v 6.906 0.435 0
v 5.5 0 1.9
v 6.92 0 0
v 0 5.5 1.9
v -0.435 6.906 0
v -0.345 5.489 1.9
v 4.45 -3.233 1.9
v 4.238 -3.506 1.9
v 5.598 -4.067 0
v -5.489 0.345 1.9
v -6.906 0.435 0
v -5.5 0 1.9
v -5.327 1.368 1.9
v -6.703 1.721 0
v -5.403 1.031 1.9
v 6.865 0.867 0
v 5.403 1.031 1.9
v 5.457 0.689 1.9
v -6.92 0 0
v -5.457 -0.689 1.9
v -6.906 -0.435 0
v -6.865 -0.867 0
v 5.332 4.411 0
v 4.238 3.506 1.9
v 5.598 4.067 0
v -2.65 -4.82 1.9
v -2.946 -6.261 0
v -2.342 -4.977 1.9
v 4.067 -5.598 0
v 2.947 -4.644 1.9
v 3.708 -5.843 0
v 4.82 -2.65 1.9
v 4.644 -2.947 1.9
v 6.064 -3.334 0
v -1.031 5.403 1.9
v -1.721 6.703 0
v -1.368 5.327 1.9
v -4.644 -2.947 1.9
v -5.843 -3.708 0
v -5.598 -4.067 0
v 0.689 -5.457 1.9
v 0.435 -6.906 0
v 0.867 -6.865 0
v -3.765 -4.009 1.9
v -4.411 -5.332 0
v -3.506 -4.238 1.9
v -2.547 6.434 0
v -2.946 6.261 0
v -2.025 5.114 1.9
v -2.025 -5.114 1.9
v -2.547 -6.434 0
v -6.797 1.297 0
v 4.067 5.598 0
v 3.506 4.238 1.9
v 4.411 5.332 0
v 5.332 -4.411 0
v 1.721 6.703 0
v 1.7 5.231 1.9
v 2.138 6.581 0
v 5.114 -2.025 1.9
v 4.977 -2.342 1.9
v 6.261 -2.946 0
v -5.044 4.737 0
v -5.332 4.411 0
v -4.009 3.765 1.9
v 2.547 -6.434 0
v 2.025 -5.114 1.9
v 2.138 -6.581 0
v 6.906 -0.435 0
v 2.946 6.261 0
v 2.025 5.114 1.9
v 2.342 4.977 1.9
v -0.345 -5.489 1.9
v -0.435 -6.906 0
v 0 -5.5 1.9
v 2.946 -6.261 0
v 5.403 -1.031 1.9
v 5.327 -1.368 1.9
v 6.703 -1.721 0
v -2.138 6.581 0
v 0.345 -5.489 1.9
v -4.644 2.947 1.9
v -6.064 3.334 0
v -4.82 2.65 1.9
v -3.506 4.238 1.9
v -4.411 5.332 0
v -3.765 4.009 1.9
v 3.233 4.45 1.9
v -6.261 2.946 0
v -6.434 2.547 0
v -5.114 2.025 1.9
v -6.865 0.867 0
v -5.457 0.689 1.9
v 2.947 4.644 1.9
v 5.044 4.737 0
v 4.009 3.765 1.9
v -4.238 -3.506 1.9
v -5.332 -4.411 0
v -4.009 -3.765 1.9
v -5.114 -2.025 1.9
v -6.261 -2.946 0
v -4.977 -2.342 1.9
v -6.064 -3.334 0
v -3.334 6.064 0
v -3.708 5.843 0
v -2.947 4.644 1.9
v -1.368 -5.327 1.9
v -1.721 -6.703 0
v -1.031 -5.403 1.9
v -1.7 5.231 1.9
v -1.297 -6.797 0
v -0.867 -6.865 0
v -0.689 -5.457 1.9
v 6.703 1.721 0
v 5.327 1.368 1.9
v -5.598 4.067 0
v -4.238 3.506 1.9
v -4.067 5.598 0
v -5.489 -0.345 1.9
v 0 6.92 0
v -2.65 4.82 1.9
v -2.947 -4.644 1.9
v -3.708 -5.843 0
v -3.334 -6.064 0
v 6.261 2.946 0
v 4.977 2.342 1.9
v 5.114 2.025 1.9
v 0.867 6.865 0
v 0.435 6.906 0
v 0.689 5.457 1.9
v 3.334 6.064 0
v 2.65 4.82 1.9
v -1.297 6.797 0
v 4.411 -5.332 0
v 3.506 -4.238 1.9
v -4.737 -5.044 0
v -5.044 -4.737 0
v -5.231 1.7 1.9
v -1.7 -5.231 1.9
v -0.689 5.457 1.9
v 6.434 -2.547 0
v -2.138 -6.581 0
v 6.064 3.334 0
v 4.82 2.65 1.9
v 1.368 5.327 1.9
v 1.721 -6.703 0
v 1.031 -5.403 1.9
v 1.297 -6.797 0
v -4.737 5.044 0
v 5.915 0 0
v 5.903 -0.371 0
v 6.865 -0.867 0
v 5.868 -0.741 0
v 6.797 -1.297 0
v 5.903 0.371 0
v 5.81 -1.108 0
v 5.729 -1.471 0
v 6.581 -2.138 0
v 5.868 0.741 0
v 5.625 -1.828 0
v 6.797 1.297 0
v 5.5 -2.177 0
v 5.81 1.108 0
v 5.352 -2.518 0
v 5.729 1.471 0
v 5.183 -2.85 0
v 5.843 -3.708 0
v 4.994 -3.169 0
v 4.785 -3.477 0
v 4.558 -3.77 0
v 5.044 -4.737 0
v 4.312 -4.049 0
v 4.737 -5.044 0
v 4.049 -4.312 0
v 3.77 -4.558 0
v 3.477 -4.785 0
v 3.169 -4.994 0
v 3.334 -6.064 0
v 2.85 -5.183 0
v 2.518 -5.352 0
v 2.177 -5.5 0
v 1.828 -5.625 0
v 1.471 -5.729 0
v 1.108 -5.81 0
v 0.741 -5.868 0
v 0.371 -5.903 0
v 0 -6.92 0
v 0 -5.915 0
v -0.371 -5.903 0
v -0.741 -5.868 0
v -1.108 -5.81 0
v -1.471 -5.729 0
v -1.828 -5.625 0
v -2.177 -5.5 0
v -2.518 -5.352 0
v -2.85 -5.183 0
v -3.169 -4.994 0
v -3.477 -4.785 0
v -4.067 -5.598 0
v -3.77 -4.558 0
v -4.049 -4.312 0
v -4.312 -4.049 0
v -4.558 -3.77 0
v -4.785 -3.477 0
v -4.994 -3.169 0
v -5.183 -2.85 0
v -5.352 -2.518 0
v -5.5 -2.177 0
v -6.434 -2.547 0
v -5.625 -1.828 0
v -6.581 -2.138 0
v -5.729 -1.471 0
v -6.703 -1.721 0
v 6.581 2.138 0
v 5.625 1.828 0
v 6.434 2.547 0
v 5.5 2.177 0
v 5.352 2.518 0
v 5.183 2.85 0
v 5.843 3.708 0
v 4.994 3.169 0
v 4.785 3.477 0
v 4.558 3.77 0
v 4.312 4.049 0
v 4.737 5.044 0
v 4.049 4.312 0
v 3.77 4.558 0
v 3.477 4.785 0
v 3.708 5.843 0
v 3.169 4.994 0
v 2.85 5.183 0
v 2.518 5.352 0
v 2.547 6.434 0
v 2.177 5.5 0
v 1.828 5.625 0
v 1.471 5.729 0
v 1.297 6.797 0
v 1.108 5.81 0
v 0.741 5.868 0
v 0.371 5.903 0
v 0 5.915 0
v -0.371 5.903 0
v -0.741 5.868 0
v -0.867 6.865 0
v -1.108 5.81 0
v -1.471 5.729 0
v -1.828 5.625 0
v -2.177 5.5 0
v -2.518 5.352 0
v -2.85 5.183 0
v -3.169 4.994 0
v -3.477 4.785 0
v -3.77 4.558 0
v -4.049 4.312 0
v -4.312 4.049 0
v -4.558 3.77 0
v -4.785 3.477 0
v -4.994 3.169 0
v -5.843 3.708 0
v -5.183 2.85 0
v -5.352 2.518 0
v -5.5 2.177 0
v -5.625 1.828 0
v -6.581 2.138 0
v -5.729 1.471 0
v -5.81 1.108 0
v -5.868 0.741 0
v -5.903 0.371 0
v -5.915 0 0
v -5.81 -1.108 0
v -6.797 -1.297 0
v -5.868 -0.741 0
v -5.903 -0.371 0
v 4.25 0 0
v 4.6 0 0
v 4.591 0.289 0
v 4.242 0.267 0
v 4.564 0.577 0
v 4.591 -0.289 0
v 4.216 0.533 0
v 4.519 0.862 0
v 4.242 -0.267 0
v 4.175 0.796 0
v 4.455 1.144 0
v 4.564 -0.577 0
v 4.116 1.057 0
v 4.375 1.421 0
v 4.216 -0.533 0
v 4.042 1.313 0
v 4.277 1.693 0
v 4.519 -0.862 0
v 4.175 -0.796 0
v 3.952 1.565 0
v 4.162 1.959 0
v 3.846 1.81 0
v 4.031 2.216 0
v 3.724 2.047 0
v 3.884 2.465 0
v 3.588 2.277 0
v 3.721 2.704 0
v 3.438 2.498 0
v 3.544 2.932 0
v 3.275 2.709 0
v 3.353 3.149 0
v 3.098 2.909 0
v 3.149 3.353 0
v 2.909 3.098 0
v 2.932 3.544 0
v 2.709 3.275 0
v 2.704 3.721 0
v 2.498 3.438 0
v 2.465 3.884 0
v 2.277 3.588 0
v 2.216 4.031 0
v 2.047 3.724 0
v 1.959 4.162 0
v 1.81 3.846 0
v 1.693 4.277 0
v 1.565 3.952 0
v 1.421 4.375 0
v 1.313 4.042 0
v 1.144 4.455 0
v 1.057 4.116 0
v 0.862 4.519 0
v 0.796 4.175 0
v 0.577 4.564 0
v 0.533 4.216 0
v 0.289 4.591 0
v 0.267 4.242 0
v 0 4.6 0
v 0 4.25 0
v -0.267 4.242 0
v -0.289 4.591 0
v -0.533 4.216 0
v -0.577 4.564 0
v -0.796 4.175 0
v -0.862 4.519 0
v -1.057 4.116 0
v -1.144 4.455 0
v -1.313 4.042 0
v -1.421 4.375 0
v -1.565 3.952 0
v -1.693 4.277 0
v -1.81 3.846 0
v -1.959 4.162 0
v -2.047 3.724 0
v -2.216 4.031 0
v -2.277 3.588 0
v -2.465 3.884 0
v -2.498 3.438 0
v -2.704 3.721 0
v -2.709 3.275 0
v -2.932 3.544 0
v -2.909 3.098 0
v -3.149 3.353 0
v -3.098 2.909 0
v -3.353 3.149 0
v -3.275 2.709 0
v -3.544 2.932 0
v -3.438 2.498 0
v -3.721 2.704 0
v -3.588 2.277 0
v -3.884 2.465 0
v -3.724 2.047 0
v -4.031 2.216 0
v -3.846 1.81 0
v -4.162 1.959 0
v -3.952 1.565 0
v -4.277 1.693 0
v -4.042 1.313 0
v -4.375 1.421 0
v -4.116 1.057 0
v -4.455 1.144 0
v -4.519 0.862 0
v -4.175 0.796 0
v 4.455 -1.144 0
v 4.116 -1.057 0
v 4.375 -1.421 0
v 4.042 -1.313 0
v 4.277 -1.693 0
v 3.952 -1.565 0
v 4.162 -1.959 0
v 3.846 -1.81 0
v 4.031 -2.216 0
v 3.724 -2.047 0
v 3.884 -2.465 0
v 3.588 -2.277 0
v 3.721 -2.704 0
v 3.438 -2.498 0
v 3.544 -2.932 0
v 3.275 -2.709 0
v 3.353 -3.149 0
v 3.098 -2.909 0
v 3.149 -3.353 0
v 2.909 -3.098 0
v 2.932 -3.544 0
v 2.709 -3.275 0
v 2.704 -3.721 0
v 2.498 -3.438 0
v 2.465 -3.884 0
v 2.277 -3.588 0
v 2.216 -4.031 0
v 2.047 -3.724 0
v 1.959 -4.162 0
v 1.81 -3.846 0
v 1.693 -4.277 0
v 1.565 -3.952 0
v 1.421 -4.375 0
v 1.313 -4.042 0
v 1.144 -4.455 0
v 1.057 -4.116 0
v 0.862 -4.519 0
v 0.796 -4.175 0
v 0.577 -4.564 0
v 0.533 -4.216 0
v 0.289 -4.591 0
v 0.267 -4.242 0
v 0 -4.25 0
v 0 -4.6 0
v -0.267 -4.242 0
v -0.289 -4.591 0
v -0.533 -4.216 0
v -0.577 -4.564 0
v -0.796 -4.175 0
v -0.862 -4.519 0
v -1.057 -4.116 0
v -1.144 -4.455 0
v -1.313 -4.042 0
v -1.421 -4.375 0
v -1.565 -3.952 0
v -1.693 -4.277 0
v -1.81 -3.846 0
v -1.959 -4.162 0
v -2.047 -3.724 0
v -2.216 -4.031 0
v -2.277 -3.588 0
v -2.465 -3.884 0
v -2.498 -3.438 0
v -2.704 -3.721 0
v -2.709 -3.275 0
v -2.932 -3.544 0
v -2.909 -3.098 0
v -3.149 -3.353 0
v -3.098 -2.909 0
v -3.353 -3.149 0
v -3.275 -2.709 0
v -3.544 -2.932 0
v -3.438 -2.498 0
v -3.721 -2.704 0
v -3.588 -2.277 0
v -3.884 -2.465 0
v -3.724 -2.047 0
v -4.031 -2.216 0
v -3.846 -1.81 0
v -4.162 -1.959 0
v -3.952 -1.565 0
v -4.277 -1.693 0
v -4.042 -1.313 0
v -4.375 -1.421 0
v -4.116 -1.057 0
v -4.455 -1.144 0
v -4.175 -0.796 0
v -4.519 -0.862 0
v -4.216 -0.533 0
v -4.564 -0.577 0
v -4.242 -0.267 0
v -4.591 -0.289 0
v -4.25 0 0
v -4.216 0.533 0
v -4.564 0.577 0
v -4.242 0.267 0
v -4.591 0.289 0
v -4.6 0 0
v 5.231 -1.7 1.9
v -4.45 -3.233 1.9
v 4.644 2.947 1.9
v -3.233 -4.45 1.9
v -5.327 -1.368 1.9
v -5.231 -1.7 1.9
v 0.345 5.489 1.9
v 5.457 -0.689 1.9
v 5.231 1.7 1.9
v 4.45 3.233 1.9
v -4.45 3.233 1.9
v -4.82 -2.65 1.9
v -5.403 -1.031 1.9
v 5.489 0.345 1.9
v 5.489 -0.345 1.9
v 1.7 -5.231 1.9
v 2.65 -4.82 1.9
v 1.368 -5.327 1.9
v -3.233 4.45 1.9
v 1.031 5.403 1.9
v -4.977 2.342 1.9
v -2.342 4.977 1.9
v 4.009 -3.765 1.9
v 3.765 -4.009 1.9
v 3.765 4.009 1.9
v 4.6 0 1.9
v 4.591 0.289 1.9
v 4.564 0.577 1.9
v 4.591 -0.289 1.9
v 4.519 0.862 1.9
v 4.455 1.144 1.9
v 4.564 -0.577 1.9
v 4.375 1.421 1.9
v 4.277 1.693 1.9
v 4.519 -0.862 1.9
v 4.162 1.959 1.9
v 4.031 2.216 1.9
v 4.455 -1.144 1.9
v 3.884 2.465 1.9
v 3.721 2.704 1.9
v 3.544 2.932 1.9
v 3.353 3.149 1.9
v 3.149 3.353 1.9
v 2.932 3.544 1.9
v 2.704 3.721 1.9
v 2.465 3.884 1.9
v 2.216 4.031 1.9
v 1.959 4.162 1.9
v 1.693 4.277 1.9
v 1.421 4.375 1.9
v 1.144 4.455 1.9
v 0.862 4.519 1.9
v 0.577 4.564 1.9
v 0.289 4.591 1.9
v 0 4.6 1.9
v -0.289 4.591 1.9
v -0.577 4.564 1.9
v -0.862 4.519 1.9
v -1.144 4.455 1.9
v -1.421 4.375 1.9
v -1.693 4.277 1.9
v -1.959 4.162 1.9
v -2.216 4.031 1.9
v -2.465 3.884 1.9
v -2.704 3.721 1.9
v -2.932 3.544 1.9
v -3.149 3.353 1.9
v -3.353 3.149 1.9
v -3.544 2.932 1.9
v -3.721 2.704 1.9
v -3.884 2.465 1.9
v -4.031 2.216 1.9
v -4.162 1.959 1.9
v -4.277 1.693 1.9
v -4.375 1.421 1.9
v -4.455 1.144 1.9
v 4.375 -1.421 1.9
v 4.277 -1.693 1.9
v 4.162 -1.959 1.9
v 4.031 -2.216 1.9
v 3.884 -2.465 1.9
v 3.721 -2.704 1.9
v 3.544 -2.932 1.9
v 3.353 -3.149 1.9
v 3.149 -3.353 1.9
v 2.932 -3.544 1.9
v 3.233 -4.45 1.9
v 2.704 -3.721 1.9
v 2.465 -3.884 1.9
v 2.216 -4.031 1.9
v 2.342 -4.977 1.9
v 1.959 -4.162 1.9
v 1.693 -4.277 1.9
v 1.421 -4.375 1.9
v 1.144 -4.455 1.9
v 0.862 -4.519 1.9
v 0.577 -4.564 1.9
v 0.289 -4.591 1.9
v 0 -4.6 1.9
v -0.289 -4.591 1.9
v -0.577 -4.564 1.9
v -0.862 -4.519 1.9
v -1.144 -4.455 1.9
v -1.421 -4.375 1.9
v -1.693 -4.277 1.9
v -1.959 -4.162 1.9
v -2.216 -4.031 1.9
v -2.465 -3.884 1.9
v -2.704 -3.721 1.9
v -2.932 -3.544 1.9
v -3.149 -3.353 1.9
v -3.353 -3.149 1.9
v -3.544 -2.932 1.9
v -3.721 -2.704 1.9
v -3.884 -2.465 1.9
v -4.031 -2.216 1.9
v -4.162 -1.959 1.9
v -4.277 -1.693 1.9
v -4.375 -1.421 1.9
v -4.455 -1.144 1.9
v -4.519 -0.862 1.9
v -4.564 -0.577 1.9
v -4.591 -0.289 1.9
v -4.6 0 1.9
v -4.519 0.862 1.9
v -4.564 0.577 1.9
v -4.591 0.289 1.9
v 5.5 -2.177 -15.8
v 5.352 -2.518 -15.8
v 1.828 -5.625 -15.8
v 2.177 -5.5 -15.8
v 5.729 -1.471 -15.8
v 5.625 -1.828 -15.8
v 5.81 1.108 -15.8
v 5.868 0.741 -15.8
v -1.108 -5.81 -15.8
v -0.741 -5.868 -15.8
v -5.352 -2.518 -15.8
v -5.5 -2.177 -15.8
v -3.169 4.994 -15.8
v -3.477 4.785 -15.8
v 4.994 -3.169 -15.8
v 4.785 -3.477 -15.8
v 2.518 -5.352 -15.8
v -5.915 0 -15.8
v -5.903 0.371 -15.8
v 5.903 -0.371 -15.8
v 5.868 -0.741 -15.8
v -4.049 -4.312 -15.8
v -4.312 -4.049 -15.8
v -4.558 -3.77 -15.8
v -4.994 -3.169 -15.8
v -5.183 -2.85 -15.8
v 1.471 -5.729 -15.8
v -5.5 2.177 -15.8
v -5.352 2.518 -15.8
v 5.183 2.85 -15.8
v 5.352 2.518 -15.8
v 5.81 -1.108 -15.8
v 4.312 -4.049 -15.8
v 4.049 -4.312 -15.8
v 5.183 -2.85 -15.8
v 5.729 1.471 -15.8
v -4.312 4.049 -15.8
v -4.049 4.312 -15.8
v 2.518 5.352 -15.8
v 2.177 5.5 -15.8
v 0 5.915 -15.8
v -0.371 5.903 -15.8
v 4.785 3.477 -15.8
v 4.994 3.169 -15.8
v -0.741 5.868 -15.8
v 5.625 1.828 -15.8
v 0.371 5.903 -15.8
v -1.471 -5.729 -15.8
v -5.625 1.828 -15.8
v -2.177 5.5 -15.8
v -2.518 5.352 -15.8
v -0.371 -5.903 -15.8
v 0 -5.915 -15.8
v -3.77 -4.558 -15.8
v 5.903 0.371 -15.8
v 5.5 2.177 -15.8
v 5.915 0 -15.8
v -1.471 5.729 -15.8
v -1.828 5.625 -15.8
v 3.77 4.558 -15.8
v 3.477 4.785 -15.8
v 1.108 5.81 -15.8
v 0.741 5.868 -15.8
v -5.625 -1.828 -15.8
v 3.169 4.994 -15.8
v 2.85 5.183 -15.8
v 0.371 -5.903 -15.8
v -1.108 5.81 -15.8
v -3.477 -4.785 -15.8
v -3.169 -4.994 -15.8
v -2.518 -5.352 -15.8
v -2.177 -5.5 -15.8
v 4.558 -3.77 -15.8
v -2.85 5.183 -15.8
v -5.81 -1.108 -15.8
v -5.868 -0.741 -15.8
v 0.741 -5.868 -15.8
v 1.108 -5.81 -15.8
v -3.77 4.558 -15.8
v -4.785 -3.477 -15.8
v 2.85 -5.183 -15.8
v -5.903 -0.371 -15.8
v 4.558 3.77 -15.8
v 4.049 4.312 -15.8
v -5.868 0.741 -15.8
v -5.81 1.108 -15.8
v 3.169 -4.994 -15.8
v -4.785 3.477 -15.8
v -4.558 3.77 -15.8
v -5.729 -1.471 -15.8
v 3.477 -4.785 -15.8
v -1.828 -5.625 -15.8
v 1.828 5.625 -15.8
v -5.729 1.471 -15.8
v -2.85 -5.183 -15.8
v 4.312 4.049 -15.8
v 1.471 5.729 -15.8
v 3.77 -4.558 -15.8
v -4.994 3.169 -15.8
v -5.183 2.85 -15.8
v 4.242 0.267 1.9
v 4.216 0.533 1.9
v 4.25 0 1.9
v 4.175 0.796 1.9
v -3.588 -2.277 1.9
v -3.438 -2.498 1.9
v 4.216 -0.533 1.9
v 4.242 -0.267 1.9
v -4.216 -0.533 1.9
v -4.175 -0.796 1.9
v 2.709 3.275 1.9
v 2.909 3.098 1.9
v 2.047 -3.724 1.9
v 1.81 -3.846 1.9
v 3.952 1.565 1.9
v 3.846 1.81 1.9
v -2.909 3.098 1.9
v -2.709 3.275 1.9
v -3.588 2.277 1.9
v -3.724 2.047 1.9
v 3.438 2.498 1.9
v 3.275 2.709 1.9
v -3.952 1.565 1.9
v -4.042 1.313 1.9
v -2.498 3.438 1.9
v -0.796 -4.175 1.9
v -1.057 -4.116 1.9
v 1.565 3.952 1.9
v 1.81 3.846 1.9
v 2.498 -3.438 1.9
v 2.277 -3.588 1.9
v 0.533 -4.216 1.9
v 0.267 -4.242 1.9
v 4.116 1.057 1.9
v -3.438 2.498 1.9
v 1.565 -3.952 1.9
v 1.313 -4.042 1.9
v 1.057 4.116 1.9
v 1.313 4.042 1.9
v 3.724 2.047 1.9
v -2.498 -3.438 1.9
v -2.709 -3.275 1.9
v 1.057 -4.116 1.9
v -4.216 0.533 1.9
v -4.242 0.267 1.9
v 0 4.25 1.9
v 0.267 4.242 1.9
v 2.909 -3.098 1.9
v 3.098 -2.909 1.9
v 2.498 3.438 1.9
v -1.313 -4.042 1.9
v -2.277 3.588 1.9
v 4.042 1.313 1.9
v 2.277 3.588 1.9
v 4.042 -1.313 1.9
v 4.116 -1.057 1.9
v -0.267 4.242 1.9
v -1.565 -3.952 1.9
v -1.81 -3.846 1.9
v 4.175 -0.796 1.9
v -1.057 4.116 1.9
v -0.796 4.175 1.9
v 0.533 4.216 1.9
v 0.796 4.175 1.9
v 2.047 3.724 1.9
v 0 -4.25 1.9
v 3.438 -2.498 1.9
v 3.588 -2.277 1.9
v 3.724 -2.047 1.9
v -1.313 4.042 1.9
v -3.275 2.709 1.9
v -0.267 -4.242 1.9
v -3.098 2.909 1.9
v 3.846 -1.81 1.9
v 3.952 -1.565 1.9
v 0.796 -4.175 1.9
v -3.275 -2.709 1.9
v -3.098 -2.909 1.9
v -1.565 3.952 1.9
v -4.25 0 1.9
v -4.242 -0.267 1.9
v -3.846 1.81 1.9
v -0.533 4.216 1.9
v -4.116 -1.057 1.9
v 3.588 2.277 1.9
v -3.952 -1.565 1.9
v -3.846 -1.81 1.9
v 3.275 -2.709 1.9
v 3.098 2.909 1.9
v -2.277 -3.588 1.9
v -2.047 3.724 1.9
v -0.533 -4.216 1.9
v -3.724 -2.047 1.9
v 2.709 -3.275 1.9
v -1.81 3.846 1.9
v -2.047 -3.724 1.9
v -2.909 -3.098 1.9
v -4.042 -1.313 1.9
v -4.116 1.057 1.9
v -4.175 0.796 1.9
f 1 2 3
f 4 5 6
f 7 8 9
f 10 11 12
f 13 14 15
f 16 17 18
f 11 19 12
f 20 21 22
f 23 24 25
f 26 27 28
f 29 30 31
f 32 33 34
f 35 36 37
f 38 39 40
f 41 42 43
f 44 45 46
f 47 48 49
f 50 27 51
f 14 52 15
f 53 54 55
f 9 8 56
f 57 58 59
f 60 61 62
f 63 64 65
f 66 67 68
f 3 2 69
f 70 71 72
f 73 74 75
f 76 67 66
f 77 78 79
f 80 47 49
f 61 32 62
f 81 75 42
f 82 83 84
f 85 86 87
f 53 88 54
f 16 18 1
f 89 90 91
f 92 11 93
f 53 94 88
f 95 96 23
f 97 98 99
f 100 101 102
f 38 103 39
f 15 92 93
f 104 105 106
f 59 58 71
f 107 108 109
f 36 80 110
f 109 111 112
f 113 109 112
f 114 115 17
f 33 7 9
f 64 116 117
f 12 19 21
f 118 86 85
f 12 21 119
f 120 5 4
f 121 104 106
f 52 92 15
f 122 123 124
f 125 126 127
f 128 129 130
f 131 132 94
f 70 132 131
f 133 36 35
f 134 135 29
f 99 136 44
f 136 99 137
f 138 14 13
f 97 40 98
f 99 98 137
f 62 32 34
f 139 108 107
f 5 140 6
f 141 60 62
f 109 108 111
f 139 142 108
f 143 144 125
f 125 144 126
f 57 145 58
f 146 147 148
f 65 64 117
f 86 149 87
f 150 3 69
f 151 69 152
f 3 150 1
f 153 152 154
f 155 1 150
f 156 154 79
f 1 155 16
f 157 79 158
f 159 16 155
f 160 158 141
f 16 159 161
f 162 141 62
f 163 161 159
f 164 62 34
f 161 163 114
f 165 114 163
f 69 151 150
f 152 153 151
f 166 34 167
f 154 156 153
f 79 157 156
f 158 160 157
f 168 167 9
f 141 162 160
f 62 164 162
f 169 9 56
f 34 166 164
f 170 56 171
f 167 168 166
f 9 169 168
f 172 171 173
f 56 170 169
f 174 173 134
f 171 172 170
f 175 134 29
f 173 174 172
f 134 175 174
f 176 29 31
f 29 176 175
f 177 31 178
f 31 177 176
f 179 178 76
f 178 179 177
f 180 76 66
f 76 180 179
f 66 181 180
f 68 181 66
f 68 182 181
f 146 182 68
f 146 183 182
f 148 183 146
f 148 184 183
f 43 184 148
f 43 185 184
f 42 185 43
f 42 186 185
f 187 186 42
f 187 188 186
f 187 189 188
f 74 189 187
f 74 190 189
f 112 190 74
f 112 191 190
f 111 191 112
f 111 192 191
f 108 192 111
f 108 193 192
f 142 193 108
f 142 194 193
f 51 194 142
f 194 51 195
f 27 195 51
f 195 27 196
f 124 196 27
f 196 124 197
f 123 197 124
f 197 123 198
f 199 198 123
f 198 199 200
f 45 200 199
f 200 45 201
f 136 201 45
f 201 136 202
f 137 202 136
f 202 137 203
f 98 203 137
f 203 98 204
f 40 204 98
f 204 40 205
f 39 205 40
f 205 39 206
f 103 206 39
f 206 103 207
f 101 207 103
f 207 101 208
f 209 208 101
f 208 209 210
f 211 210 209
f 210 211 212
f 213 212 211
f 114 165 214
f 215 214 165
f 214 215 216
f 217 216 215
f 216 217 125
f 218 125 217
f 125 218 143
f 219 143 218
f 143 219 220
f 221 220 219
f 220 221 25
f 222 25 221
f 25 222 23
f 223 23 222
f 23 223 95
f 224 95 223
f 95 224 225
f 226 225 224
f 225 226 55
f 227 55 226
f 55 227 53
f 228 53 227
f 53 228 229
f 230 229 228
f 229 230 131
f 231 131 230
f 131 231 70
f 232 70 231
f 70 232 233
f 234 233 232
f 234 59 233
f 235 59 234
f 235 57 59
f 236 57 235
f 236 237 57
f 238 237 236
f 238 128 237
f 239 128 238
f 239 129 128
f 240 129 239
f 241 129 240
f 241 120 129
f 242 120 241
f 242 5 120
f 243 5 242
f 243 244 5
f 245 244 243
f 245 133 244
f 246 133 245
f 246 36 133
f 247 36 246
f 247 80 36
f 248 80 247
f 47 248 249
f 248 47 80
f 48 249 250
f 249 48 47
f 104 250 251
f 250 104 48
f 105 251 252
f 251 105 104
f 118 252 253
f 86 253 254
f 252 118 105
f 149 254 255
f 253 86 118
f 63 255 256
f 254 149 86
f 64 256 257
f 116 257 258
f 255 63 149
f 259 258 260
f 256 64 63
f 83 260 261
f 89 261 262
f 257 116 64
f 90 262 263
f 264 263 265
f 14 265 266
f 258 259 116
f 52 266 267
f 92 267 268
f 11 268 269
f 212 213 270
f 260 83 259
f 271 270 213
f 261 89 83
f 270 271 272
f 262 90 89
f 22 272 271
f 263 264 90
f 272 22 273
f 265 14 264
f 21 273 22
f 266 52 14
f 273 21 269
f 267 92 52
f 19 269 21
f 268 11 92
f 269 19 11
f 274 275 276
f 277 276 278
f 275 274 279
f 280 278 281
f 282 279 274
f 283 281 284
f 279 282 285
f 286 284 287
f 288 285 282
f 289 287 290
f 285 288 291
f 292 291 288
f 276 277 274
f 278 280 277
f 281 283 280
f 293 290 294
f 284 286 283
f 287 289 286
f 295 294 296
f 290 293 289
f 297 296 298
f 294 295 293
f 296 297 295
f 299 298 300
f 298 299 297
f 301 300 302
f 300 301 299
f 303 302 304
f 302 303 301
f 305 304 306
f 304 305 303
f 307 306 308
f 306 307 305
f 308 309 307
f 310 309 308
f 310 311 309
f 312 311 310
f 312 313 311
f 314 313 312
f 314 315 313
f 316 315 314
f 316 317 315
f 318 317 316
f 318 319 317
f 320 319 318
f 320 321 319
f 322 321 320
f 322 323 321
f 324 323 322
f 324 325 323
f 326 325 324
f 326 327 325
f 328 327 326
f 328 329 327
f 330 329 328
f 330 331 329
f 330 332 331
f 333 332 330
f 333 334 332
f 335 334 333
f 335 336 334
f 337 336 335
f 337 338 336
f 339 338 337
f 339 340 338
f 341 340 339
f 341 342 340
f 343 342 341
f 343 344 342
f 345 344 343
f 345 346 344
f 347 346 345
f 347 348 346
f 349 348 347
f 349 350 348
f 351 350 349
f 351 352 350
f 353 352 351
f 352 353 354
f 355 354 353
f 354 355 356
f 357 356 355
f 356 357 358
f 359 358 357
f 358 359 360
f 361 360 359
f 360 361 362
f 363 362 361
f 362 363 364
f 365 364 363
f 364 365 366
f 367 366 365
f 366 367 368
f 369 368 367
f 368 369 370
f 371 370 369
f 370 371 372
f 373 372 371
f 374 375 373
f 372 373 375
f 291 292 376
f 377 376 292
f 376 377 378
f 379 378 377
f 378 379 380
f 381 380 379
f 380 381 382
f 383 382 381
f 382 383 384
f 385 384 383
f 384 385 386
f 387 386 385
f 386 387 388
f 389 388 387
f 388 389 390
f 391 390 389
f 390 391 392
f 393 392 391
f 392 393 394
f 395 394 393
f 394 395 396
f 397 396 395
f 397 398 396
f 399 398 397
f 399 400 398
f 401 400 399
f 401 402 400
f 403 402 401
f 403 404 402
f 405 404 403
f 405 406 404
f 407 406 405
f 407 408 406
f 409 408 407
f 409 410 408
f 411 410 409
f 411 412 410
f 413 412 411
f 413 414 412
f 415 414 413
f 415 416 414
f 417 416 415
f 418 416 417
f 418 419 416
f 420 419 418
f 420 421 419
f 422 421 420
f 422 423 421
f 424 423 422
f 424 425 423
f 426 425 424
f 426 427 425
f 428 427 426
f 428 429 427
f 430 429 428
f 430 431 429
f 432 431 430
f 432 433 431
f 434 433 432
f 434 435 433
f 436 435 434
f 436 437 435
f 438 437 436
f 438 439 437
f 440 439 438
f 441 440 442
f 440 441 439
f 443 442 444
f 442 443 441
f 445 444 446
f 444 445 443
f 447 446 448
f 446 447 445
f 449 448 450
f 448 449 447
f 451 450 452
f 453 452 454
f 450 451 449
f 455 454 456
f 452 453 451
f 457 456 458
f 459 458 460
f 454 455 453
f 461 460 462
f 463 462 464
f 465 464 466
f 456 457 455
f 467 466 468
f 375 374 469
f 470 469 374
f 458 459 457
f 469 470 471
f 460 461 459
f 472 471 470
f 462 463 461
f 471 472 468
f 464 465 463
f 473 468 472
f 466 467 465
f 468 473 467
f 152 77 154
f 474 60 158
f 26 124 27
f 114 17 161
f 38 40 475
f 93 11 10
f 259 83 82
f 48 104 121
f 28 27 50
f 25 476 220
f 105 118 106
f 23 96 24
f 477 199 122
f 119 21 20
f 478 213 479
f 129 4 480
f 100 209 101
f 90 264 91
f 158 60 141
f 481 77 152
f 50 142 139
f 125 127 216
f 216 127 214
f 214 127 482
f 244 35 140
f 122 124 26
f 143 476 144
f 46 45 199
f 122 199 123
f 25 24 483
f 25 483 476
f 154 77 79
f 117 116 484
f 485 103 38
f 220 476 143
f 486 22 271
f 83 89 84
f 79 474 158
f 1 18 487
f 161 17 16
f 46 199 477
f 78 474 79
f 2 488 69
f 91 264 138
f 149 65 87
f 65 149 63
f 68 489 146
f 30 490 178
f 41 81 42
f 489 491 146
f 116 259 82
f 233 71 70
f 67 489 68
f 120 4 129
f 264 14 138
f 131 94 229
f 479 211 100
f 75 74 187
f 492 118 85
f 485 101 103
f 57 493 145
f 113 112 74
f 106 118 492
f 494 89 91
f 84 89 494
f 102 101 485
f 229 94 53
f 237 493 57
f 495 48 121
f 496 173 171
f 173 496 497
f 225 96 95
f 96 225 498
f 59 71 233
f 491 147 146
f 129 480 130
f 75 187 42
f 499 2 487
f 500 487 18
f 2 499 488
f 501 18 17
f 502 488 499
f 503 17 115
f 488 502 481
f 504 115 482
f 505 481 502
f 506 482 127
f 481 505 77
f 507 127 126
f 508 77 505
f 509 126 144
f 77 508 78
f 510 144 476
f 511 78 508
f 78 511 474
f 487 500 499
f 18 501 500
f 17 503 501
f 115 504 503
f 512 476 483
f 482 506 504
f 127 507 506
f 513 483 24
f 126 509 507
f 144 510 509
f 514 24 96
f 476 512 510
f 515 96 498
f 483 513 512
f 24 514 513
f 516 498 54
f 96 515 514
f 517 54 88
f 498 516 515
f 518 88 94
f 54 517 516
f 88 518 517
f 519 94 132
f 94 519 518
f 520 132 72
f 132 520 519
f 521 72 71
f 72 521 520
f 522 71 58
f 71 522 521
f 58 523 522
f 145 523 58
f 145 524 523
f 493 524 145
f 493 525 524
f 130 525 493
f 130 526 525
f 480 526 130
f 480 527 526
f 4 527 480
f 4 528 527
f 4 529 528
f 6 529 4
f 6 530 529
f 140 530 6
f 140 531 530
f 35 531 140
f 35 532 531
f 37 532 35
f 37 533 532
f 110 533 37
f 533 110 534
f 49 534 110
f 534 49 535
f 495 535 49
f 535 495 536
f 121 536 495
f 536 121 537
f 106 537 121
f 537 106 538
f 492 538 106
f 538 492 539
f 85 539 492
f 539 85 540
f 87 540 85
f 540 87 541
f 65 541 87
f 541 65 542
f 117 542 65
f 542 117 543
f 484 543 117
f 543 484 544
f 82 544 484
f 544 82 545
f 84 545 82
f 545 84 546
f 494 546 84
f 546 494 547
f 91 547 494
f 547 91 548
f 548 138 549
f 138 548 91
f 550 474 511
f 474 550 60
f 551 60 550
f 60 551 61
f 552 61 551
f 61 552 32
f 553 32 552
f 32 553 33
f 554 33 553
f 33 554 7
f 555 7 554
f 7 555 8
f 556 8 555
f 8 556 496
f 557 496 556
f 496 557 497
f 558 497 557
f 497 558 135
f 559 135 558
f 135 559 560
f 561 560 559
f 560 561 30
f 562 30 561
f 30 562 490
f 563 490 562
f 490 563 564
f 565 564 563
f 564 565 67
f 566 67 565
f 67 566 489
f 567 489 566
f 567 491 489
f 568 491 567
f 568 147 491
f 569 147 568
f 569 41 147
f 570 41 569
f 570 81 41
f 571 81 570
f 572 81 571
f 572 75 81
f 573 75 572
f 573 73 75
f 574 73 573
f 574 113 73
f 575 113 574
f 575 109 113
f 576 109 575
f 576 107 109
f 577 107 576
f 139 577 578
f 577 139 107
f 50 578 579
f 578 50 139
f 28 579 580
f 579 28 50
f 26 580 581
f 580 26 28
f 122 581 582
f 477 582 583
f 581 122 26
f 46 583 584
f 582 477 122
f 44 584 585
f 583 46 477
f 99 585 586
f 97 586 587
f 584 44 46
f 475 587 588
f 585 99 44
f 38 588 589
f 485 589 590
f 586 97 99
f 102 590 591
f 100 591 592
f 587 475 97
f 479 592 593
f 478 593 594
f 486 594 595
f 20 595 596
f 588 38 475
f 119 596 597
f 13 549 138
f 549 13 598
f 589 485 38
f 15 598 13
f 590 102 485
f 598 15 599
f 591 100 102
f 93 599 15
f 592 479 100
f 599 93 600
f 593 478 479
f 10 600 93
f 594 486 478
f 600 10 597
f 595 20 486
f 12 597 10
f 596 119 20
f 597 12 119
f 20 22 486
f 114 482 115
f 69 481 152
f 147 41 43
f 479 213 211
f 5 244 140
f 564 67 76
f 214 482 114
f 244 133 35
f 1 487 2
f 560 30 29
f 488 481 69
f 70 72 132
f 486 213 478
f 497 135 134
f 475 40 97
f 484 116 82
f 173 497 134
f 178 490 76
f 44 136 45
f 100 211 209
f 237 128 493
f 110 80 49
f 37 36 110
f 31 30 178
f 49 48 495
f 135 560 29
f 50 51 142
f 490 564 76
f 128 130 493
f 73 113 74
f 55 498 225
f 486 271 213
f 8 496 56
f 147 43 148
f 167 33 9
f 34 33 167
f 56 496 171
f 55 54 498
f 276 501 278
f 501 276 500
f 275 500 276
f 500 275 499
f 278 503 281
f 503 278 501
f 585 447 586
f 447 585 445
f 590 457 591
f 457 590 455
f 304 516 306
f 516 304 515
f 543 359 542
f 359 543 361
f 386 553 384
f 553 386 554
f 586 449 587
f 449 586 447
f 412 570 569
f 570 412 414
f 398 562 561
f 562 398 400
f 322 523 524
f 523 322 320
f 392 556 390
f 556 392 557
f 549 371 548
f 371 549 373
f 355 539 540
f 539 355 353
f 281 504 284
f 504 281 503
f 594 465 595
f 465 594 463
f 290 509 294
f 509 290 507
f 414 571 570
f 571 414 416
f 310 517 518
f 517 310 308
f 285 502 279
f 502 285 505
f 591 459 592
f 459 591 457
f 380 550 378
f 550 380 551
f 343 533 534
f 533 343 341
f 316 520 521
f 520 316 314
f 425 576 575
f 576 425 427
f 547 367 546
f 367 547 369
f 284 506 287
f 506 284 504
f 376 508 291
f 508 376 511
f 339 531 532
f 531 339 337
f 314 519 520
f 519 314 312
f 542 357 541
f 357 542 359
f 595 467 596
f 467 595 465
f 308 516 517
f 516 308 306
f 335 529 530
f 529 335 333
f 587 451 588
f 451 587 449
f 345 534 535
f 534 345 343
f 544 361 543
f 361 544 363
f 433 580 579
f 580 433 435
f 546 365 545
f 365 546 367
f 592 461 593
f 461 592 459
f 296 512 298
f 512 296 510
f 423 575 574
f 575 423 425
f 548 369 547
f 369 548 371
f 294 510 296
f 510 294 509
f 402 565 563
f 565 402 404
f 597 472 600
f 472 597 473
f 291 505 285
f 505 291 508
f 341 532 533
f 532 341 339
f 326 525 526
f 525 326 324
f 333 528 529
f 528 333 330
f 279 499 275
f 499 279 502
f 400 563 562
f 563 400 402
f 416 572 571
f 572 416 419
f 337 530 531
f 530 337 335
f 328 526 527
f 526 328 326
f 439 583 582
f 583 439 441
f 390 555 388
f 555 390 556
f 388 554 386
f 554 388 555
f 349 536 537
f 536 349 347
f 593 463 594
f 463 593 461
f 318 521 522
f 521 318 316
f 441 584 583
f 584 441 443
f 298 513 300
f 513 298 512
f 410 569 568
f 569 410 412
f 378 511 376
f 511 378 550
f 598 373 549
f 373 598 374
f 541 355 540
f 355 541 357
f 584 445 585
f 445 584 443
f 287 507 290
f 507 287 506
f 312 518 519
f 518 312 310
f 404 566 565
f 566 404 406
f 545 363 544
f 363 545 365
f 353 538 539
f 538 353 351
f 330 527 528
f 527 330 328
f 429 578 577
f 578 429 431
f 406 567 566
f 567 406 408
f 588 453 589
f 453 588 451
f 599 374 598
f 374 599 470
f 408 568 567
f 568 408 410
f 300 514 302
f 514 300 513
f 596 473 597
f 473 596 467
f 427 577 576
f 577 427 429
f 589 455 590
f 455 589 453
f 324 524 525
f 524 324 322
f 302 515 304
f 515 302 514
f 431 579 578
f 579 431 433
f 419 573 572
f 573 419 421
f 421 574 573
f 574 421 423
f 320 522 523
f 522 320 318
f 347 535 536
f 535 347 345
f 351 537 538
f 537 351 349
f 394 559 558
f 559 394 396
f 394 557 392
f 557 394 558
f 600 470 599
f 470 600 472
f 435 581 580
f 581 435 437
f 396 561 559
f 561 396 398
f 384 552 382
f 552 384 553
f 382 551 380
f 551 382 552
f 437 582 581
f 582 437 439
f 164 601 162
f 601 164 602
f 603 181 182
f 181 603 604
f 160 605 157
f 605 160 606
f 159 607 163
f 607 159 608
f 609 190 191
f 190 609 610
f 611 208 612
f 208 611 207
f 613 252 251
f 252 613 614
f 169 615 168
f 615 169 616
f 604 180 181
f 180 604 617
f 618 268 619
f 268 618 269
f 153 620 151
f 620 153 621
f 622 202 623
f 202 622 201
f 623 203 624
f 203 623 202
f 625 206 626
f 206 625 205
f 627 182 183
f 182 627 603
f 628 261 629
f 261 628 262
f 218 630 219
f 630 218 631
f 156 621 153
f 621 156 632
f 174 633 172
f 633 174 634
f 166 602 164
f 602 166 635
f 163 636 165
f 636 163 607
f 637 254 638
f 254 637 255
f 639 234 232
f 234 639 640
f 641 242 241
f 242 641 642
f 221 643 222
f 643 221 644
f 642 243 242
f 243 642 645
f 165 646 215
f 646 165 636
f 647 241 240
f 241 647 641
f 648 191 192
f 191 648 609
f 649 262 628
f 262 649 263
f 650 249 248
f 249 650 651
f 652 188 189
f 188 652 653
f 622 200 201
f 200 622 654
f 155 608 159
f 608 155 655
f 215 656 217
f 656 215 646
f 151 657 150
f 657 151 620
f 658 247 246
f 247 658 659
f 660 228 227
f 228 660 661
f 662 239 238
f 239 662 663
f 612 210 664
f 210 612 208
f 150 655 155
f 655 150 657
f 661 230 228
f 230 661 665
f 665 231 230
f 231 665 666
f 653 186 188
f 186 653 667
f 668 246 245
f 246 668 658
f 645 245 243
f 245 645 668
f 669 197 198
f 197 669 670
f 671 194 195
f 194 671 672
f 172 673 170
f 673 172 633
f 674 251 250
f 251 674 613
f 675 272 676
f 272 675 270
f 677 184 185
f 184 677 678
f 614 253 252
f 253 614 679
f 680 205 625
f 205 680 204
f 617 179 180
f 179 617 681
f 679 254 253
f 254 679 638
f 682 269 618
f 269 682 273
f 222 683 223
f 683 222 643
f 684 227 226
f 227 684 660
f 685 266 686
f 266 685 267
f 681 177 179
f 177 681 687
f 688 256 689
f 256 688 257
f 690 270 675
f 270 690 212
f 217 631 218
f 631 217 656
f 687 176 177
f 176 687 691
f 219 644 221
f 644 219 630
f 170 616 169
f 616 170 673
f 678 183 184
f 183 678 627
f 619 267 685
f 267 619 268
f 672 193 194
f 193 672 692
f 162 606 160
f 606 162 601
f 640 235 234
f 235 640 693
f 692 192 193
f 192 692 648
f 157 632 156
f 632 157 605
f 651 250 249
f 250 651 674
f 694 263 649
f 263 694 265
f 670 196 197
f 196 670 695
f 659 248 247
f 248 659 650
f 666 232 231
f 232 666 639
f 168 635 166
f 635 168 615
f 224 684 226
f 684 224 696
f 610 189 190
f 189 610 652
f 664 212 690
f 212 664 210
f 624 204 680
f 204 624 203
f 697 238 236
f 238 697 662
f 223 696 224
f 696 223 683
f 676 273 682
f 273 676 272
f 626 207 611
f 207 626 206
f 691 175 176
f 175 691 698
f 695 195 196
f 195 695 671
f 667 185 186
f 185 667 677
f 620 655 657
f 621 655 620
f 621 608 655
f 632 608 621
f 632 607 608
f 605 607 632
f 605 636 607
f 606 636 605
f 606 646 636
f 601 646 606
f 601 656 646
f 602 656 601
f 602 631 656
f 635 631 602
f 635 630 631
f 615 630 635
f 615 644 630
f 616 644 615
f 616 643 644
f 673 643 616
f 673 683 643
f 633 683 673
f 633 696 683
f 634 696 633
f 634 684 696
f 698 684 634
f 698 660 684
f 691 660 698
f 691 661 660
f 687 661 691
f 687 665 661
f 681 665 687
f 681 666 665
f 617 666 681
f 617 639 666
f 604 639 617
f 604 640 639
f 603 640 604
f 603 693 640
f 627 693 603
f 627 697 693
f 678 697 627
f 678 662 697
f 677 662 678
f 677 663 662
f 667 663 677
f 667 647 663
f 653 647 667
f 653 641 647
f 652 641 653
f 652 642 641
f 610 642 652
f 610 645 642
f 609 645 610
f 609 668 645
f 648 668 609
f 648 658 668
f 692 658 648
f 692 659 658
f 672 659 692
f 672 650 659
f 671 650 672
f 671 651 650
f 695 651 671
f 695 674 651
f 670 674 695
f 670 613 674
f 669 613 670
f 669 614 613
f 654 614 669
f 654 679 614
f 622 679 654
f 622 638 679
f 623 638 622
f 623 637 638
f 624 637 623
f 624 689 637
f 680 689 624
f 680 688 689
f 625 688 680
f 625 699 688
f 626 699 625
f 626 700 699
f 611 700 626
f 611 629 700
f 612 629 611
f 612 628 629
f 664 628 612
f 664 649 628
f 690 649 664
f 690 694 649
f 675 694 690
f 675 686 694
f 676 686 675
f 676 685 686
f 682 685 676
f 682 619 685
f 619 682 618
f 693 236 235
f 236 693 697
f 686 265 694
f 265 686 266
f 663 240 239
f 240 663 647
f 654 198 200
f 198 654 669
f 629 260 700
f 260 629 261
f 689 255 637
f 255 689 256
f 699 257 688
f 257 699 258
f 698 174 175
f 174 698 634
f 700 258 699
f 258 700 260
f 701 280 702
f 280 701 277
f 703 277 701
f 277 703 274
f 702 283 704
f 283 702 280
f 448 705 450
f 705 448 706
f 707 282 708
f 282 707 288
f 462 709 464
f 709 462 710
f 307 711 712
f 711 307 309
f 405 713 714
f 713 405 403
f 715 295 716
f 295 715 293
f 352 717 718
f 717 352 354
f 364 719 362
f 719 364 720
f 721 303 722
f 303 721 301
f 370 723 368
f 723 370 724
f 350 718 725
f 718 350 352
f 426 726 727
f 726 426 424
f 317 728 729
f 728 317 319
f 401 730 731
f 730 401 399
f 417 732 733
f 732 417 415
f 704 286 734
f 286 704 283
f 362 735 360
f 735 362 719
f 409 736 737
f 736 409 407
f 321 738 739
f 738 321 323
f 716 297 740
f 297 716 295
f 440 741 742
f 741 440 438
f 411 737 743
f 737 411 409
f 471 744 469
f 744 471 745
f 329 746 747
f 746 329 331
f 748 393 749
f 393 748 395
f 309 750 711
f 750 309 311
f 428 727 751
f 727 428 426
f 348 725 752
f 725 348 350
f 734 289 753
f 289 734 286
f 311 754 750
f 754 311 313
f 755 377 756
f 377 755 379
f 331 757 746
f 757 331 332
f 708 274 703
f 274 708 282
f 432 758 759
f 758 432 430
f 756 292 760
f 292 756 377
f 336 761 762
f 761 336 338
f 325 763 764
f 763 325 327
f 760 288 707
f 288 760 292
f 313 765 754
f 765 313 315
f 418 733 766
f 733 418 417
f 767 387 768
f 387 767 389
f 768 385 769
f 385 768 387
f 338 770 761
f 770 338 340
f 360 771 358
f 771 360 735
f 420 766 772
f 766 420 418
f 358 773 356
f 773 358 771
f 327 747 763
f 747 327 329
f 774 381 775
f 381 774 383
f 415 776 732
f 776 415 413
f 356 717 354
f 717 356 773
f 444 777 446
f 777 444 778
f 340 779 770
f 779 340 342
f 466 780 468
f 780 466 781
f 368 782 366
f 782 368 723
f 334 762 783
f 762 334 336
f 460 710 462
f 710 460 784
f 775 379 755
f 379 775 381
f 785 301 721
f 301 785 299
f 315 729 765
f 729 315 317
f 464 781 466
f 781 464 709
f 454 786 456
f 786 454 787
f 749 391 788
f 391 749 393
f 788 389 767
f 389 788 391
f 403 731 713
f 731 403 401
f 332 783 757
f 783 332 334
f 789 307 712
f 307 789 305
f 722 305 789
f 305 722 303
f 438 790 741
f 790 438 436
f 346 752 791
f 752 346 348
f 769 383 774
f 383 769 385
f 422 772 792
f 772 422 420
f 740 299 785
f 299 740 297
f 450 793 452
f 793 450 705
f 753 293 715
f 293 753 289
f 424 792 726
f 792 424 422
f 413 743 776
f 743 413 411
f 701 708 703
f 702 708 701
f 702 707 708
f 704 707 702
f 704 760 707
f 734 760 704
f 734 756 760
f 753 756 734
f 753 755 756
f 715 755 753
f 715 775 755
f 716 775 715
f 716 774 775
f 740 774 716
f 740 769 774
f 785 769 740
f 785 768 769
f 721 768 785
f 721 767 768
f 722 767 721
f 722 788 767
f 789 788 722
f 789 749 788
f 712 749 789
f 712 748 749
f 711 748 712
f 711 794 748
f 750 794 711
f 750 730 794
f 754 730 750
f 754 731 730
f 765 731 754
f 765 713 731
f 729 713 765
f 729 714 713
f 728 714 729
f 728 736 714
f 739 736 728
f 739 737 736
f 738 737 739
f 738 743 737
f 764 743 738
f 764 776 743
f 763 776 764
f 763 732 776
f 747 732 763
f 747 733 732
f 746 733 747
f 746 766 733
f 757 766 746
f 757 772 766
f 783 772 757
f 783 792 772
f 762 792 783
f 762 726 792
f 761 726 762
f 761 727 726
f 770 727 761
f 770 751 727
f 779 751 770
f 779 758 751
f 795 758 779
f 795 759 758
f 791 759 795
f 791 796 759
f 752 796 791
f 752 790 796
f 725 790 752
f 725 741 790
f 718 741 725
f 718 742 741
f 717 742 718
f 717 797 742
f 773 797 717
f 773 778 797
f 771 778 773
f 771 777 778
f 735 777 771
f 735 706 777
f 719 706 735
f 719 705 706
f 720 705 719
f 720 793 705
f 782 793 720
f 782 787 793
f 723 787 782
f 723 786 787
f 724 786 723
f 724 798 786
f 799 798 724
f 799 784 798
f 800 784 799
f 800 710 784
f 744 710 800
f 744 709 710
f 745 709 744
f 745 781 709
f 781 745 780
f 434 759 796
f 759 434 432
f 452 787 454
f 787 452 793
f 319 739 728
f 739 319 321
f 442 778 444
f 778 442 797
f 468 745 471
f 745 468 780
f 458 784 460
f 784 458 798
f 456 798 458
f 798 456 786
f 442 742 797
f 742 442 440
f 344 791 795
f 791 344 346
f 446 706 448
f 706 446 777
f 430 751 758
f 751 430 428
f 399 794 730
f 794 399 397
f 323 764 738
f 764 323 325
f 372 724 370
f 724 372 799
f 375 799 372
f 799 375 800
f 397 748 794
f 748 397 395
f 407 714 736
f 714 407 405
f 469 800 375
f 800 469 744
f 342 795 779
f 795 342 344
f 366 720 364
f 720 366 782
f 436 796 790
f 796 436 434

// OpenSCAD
buttonAsset();


module buttonAsset(
    _fn = 100
) {
    
    diameter = 11.83;
    head_diameter = 13.84;
    head_z_size = 1.9;
    button_without_head_z_size = 15.8;
    button_diameter = 8.5;
    button_border_diameter = 11;

    color("DarkGray") {
        translate([0, 0, -button_without_head_z_size])
            cylinder(
                d = diameter,
                h = button_without_head_z_size,
                center = false,
                $fn = _fn
            );

        difference() {
            cylinder(
                d1 = head_diameter,
                d2 = button_border_diameter,
                h = head_z_size,
                center=false,
                $fn = _fn
            );

            translate([0,0,-0.05])
                cylinder(
                    d = button_diameter + 0.7,
                    h = head_z_size + 0.1,
                    center=false,
                    $fn = _fn
                );
        }

        cylinder(
            d = button_diameter,
            h = head_z_size,
            center=false,
            $fn = _fn
        );
    }
}
